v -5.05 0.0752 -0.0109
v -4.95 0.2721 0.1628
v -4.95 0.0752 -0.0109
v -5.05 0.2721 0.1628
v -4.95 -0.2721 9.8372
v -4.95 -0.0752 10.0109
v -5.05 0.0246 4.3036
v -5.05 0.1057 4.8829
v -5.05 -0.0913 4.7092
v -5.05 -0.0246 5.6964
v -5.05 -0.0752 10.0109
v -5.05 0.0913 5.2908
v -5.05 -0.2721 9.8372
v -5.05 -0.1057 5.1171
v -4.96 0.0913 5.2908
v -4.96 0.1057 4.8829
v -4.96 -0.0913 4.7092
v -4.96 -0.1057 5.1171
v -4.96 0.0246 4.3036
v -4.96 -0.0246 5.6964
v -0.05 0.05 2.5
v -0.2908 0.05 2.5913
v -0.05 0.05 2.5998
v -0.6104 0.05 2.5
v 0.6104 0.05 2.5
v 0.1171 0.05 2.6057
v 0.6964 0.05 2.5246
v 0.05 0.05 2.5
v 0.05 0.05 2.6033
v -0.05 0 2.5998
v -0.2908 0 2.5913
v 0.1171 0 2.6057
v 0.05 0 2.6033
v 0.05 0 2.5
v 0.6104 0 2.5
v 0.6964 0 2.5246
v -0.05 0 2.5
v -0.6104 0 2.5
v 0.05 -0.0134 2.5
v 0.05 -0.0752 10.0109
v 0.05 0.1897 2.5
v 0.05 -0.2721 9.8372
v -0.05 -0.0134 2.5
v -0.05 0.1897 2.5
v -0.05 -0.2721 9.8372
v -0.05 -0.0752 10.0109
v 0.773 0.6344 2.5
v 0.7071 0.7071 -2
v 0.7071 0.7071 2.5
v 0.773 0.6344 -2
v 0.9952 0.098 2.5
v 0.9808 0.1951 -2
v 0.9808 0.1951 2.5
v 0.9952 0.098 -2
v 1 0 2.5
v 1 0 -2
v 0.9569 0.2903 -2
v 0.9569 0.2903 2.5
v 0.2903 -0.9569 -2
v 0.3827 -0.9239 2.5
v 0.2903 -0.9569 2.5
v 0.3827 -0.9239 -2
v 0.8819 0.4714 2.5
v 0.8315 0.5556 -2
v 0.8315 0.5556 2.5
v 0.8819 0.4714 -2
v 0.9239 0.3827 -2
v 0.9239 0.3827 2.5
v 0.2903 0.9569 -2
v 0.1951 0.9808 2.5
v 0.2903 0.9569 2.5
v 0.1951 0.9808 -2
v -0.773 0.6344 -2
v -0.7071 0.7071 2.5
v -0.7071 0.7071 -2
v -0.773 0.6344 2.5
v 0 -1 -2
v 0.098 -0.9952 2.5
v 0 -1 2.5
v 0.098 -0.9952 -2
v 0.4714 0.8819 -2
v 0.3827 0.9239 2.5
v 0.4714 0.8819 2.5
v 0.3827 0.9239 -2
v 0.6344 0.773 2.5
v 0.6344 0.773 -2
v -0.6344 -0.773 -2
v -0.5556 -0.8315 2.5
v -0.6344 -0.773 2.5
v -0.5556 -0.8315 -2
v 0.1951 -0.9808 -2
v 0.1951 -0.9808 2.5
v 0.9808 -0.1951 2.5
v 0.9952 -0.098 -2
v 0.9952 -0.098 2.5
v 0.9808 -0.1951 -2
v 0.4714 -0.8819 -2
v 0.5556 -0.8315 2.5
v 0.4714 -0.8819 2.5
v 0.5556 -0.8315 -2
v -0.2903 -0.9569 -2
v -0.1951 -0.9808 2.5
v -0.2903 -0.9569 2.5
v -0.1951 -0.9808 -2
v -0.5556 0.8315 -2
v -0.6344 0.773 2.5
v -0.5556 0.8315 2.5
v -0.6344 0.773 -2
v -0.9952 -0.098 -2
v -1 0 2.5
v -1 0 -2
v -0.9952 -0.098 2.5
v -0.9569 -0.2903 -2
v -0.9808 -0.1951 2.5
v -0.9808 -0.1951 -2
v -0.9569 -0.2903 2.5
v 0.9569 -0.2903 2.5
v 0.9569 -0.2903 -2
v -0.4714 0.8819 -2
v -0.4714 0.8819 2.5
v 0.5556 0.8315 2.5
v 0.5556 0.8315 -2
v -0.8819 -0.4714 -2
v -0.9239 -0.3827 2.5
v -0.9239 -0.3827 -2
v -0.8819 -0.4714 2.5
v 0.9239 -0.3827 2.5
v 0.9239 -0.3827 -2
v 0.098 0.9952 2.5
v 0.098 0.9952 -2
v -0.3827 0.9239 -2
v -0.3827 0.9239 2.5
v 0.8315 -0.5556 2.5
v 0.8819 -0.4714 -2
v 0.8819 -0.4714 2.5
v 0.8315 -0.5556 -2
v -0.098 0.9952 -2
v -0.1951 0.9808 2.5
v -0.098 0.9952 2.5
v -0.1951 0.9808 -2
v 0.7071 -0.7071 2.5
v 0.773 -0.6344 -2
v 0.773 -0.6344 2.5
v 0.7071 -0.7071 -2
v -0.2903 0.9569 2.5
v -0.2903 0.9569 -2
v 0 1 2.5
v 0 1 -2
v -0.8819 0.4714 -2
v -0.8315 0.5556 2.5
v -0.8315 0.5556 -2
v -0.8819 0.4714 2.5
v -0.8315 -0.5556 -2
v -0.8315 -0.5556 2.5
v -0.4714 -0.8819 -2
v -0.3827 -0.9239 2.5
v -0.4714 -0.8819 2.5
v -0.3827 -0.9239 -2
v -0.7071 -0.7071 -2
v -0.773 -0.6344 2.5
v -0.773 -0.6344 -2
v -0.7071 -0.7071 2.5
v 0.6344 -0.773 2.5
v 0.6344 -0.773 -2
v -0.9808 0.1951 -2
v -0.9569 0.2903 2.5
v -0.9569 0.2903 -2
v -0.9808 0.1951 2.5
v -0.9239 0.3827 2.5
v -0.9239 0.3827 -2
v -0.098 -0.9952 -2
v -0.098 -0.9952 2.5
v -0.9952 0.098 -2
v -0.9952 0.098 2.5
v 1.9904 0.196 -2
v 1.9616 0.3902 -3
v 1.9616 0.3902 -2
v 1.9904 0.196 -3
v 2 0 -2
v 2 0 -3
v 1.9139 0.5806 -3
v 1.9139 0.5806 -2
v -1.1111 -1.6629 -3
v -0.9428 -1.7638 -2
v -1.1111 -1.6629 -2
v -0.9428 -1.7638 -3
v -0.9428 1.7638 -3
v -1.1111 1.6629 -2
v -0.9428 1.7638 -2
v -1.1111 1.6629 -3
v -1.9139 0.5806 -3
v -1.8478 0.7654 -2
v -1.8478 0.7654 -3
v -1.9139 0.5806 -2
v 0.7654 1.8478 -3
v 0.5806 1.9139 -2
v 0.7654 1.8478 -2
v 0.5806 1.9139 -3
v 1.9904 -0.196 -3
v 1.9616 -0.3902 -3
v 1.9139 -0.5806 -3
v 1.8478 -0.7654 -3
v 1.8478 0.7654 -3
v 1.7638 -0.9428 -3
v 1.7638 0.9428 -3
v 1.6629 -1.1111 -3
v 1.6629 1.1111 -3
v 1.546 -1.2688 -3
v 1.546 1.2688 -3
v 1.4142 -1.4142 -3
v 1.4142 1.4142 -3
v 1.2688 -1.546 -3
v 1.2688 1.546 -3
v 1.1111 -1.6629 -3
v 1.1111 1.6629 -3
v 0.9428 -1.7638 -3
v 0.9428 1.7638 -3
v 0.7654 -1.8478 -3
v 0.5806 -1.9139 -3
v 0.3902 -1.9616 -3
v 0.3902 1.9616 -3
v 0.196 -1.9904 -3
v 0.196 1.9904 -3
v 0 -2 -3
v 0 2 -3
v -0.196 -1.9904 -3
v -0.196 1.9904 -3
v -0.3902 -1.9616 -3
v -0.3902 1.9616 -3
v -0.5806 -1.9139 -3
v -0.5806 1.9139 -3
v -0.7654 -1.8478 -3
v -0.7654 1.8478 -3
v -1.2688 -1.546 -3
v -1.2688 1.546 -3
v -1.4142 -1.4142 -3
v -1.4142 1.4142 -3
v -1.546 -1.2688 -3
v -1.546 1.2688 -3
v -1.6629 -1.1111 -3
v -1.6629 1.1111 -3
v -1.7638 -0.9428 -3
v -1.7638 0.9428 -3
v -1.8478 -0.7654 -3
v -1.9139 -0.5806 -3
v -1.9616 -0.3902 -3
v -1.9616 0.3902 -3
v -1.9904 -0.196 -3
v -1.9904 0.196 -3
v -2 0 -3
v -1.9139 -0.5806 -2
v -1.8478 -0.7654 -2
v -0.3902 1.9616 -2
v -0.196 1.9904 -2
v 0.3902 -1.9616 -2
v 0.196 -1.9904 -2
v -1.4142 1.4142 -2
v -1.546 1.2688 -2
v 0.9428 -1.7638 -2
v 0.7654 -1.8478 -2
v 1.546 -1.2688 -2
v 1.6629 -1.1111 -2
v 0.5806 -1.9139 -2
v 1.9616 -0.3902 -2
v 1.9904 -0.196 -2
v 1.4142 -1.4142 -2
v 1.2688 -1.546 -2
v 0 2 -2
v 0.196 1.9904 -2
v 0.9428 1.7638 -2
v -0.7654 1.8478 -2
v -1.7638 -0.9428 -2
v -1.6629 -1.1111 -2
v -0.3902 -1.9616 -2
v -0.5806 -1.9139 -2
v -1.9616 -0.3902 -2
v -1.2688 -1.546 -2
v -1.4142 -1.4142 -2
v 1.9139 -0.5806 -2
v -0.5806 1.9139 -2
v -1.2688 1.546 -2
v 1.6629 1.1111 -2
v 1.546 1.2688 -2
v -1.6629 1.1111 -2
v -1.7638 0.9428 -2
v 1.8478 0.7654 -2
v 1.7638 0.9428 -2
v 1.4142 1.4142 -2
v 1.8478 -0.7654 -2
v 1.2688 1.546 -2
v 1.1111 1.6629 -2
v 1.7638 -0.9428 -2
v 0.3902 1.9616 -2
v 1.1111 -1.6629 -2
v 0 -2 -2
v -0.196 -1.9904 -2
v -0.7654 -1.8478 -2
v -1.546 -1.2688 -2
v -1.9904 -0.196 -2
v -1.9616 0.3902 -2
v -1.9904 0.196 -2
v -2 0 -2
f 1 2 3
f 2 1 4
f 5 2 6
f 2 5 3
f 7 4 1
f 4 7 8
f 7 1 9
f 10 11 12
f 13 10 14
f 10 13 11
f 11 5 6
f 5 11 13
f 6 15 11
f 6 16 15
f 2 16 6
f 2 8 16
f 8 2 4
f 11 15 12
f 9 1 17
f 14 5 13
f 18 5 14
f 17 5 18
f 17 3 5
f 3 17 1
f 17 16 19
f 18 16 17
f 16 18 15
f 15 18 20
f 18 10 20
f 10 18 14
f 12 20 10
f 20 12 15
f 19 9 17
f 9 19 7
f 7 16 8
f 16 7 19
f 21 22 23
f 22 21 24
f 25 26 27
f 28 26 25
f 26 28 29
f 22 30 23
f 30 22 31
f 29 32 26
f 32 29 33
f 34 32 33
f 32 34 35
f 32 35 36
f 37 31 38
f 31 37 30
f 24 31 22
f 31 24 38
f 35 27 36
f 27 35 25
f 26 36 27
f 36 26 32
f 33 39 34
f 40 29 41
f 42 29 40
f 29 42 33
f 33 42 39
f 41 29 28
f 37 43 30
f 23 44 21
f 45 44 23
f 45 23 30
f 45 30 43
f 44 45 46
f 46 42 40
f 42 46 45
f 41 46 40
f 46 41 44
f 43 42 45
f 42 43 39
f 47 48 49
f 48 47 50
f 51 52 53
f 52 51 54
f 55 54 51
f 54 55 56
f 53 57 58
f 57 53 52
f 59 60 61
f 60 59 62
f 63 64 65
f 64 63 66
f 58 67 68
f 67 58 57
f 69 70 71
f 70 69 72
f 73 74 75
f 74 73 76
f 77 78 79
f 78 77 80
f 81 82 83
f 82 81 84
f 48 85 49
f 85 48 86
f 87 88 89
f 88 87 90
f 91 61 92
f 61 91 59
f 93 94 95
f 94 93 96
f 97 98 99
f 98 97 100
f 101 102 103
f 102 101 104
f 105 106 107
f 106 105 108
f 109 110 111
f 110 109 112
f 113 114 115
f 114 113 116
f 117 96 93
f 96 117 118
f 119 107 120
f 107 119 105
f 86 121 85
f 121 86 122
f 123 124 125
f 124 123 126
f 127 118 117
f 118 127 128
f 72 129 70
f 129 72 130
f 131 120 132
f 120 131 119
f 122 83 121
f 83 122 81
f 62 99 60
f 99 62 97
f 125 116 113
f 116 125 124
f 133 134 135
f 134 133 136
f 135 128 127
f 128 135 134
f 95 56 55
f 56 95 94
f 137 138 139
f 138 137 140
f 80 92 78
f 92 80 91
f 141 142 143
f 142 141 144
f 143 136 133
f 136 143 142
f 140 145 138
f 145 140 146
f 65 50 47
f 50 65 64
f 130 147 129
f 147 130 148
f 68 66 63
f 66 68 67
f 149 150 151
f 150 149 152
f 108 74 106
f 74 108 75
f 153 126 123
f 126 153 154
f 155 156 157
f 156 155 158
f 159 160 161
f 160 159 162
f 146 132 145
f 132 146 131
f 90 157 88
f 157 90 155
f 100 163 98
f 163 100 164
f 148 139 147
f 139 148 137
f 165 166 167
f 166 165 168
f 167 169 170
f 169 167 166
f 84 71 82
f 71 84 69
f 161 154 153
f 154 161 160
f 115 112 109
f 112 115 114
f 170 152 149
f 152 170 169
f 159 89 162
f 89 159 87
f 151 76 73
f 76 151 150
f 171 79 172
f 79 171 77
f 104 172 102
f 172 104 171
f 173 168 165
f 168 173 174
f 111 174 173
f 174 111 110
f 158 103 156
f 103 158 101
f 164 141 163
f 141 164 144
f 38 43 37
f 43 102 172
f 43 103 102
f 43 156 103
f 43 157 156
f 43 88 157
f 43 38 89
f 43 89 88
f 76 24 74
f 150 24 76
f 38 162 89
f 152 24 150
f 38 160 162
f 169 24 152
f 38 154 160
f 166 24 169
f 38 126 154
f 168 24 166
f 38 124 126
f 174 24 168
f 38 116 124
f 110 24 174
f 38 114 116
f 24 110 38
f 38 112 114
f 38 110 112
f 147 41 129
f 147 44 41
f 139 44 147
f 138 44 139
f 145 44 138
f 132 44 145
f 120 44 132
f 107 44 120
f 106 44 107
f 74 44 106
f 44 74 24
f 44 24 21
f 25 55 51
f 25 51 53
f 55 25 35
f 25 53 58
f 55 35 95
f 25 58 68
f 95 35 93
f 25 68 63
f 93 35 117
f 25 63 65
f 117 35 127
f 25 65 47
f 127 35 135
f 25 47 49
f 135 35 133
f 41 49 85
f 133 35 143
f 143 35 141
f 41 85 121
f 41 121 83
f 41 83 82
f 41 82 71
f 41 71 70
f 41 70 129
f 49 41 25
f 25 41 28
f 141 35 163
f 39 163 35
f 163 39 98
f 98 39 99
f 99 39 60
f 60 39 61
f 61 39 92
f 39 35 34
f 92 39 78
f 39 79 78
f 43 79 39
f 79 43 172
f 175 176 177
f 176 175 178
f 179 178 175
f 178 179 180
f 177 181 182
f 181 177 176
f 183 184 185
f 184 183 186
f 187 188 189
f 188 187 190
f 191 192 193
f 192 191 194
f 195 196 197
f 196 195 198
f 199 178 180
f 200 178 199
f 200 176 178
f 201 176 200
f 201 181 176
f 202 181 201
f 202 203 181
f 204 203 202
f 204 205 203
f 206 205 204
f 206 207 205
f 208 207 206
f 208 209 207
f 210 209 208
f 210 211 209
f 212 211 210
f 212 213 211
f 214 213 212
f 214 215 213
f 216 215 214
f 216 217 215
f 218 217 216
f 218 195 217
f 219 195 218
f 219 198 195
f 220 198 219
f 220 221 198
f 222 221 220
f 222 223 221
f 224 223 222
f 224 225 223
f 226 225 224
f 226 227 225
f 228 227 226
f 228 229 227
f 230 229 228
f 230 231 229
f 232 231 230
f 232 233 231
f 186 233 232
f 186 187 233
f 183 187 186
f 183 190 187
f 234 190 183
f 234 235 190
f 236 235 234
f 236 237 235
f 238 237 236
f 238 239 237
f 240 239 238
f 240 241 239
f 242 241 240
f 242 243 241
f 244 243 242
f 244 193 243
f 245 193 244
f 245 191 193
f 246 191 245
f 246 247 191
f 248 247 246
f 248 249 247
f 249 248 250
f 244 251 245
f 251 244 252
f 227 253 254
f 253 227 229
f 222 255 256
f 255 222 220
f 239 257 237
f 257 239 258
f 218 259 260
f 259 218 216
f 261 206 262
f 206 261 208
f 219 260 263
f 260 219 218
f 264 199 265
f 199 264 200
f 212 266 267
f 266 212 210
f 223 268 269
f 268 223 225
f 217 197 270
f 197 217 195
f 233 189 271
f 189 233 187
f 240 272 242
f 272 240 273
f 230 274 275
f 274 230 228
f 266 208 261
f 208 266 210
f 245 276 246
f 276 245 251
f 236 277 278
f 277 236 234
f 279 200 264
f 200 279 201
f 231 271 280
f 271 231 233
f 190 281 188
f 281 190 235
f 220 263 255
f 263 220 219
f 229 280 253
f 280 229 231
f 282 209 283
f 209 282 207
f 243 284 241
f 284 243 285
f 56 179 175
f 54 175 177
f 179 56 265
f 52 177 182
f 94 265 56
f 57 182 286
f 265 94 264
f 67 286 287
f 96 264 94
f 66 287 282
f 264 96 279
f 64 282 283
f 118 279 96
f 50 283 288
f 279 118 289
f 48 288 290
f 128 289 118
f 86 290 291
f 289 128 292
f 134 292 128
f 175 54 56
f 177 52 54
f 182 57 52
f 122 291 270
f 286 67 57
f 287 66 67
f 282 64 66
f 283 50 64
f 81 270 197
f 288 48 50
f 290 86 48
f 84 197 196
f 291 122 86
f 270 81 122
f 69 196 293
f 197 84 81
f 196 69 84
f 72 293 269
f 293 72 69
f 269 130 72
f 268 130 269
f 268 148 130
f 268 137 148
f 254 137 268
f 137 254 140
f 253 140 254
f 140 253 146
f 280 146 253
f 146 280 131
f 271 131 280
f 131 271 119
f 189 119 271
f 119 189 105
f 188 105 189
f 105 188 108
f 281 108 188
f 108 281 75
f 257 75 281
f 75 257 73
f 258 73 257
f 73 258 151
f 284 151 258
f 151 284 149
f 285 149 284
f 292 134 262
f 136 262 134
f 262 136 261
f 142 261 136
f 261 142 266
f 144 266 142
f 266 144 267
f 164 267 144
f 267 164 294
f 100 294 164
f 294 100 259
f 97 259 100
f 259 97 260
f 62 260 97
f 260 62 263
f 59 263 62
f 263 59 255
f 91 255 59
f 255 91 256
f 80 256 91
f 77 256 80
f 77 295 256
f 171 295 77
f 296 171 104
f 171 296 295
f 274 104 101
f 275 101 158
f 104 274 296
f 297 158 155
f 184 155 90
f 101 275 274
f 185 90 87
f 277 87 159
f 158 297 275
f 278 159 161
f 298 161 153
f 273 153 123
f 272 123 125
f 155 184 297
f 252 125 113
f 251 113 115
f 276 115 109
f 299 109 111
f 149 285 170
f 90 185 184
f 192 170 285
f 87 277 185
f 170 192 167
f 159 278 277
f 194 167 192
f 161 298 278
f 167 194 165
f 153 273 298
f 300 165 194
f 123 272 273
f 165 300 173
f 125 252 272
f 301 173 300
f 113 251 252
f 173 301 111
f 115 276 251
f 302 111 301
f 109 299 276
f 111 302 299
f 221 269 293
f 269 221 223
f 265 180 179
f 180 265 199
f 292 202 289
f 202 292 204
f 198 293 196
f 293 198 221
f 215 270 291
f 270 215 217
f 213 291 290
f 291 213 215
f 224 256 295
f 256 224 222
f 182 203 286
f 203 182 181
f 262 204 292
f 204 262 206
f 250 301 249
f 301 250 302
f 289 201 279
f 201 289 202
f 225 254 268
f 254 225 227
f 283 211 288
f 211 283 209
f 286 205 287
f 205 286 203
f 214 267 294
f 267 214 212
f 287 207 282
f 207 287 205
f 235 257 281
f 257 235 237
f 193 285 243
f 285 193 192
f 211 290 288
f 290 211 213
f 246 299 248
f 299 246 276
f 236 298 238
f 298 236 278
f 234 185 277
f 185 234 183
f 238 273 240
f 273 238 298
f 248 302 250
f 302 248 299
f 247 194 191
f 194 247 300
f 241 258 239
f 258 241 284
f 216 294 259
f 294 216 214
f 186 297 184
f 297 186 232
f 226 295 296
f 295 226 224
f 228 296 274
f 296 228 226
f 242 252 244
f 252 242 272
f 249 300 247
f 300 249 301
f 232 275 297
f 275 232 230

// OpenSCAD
$fn=64;

module handle() {
    union() {
        // Grip
        translate([0, 0, 5])
        rotate([0, 90, 0])
        scale([1, 0.2, 0.1])
        rotate([0, 0, 10])
        cube([10, 1, 1], center=true);

        // Diamond-shaped recessed feature
        translate([-5, 0, 5])
        rotate([0, 90, 0])
        scale([1, 0.2, 0.1])
        rotate([0, 0, 10])
        difference() {
            cube([10, 1, 1], center=true);
            translate([0, 0, -0.1])
            rotate([0, 0, 45])
            scale([0.5, 0.5, 0.5])
            cube([2, 2, 2], center=true);
        }

        // Stem
        translate([0, 0, 0])
        cylinder(h=5, r1=1, r2=1, center=true);

        // Flanged base
        translate([0, 0, -2.5])
        cylinder(h=1, r1=2, r2=2, center=true);

        // Gusset-like transitions
        translate([0, 0, 2.5])
        rotate([90, 0, 0])
        scale([1, 0.2, 0.1])
        rotate([0, 0, 10])
        intersection() {
            cube([10, 1, 1], center=true);
            translate([0, 0, -0.5])
            rotate([0, 0, 45])
            scale([0.5, 0.5, 0.5])
            cube([2, 2, 2], center=true);
        }
    }
}

handle();
